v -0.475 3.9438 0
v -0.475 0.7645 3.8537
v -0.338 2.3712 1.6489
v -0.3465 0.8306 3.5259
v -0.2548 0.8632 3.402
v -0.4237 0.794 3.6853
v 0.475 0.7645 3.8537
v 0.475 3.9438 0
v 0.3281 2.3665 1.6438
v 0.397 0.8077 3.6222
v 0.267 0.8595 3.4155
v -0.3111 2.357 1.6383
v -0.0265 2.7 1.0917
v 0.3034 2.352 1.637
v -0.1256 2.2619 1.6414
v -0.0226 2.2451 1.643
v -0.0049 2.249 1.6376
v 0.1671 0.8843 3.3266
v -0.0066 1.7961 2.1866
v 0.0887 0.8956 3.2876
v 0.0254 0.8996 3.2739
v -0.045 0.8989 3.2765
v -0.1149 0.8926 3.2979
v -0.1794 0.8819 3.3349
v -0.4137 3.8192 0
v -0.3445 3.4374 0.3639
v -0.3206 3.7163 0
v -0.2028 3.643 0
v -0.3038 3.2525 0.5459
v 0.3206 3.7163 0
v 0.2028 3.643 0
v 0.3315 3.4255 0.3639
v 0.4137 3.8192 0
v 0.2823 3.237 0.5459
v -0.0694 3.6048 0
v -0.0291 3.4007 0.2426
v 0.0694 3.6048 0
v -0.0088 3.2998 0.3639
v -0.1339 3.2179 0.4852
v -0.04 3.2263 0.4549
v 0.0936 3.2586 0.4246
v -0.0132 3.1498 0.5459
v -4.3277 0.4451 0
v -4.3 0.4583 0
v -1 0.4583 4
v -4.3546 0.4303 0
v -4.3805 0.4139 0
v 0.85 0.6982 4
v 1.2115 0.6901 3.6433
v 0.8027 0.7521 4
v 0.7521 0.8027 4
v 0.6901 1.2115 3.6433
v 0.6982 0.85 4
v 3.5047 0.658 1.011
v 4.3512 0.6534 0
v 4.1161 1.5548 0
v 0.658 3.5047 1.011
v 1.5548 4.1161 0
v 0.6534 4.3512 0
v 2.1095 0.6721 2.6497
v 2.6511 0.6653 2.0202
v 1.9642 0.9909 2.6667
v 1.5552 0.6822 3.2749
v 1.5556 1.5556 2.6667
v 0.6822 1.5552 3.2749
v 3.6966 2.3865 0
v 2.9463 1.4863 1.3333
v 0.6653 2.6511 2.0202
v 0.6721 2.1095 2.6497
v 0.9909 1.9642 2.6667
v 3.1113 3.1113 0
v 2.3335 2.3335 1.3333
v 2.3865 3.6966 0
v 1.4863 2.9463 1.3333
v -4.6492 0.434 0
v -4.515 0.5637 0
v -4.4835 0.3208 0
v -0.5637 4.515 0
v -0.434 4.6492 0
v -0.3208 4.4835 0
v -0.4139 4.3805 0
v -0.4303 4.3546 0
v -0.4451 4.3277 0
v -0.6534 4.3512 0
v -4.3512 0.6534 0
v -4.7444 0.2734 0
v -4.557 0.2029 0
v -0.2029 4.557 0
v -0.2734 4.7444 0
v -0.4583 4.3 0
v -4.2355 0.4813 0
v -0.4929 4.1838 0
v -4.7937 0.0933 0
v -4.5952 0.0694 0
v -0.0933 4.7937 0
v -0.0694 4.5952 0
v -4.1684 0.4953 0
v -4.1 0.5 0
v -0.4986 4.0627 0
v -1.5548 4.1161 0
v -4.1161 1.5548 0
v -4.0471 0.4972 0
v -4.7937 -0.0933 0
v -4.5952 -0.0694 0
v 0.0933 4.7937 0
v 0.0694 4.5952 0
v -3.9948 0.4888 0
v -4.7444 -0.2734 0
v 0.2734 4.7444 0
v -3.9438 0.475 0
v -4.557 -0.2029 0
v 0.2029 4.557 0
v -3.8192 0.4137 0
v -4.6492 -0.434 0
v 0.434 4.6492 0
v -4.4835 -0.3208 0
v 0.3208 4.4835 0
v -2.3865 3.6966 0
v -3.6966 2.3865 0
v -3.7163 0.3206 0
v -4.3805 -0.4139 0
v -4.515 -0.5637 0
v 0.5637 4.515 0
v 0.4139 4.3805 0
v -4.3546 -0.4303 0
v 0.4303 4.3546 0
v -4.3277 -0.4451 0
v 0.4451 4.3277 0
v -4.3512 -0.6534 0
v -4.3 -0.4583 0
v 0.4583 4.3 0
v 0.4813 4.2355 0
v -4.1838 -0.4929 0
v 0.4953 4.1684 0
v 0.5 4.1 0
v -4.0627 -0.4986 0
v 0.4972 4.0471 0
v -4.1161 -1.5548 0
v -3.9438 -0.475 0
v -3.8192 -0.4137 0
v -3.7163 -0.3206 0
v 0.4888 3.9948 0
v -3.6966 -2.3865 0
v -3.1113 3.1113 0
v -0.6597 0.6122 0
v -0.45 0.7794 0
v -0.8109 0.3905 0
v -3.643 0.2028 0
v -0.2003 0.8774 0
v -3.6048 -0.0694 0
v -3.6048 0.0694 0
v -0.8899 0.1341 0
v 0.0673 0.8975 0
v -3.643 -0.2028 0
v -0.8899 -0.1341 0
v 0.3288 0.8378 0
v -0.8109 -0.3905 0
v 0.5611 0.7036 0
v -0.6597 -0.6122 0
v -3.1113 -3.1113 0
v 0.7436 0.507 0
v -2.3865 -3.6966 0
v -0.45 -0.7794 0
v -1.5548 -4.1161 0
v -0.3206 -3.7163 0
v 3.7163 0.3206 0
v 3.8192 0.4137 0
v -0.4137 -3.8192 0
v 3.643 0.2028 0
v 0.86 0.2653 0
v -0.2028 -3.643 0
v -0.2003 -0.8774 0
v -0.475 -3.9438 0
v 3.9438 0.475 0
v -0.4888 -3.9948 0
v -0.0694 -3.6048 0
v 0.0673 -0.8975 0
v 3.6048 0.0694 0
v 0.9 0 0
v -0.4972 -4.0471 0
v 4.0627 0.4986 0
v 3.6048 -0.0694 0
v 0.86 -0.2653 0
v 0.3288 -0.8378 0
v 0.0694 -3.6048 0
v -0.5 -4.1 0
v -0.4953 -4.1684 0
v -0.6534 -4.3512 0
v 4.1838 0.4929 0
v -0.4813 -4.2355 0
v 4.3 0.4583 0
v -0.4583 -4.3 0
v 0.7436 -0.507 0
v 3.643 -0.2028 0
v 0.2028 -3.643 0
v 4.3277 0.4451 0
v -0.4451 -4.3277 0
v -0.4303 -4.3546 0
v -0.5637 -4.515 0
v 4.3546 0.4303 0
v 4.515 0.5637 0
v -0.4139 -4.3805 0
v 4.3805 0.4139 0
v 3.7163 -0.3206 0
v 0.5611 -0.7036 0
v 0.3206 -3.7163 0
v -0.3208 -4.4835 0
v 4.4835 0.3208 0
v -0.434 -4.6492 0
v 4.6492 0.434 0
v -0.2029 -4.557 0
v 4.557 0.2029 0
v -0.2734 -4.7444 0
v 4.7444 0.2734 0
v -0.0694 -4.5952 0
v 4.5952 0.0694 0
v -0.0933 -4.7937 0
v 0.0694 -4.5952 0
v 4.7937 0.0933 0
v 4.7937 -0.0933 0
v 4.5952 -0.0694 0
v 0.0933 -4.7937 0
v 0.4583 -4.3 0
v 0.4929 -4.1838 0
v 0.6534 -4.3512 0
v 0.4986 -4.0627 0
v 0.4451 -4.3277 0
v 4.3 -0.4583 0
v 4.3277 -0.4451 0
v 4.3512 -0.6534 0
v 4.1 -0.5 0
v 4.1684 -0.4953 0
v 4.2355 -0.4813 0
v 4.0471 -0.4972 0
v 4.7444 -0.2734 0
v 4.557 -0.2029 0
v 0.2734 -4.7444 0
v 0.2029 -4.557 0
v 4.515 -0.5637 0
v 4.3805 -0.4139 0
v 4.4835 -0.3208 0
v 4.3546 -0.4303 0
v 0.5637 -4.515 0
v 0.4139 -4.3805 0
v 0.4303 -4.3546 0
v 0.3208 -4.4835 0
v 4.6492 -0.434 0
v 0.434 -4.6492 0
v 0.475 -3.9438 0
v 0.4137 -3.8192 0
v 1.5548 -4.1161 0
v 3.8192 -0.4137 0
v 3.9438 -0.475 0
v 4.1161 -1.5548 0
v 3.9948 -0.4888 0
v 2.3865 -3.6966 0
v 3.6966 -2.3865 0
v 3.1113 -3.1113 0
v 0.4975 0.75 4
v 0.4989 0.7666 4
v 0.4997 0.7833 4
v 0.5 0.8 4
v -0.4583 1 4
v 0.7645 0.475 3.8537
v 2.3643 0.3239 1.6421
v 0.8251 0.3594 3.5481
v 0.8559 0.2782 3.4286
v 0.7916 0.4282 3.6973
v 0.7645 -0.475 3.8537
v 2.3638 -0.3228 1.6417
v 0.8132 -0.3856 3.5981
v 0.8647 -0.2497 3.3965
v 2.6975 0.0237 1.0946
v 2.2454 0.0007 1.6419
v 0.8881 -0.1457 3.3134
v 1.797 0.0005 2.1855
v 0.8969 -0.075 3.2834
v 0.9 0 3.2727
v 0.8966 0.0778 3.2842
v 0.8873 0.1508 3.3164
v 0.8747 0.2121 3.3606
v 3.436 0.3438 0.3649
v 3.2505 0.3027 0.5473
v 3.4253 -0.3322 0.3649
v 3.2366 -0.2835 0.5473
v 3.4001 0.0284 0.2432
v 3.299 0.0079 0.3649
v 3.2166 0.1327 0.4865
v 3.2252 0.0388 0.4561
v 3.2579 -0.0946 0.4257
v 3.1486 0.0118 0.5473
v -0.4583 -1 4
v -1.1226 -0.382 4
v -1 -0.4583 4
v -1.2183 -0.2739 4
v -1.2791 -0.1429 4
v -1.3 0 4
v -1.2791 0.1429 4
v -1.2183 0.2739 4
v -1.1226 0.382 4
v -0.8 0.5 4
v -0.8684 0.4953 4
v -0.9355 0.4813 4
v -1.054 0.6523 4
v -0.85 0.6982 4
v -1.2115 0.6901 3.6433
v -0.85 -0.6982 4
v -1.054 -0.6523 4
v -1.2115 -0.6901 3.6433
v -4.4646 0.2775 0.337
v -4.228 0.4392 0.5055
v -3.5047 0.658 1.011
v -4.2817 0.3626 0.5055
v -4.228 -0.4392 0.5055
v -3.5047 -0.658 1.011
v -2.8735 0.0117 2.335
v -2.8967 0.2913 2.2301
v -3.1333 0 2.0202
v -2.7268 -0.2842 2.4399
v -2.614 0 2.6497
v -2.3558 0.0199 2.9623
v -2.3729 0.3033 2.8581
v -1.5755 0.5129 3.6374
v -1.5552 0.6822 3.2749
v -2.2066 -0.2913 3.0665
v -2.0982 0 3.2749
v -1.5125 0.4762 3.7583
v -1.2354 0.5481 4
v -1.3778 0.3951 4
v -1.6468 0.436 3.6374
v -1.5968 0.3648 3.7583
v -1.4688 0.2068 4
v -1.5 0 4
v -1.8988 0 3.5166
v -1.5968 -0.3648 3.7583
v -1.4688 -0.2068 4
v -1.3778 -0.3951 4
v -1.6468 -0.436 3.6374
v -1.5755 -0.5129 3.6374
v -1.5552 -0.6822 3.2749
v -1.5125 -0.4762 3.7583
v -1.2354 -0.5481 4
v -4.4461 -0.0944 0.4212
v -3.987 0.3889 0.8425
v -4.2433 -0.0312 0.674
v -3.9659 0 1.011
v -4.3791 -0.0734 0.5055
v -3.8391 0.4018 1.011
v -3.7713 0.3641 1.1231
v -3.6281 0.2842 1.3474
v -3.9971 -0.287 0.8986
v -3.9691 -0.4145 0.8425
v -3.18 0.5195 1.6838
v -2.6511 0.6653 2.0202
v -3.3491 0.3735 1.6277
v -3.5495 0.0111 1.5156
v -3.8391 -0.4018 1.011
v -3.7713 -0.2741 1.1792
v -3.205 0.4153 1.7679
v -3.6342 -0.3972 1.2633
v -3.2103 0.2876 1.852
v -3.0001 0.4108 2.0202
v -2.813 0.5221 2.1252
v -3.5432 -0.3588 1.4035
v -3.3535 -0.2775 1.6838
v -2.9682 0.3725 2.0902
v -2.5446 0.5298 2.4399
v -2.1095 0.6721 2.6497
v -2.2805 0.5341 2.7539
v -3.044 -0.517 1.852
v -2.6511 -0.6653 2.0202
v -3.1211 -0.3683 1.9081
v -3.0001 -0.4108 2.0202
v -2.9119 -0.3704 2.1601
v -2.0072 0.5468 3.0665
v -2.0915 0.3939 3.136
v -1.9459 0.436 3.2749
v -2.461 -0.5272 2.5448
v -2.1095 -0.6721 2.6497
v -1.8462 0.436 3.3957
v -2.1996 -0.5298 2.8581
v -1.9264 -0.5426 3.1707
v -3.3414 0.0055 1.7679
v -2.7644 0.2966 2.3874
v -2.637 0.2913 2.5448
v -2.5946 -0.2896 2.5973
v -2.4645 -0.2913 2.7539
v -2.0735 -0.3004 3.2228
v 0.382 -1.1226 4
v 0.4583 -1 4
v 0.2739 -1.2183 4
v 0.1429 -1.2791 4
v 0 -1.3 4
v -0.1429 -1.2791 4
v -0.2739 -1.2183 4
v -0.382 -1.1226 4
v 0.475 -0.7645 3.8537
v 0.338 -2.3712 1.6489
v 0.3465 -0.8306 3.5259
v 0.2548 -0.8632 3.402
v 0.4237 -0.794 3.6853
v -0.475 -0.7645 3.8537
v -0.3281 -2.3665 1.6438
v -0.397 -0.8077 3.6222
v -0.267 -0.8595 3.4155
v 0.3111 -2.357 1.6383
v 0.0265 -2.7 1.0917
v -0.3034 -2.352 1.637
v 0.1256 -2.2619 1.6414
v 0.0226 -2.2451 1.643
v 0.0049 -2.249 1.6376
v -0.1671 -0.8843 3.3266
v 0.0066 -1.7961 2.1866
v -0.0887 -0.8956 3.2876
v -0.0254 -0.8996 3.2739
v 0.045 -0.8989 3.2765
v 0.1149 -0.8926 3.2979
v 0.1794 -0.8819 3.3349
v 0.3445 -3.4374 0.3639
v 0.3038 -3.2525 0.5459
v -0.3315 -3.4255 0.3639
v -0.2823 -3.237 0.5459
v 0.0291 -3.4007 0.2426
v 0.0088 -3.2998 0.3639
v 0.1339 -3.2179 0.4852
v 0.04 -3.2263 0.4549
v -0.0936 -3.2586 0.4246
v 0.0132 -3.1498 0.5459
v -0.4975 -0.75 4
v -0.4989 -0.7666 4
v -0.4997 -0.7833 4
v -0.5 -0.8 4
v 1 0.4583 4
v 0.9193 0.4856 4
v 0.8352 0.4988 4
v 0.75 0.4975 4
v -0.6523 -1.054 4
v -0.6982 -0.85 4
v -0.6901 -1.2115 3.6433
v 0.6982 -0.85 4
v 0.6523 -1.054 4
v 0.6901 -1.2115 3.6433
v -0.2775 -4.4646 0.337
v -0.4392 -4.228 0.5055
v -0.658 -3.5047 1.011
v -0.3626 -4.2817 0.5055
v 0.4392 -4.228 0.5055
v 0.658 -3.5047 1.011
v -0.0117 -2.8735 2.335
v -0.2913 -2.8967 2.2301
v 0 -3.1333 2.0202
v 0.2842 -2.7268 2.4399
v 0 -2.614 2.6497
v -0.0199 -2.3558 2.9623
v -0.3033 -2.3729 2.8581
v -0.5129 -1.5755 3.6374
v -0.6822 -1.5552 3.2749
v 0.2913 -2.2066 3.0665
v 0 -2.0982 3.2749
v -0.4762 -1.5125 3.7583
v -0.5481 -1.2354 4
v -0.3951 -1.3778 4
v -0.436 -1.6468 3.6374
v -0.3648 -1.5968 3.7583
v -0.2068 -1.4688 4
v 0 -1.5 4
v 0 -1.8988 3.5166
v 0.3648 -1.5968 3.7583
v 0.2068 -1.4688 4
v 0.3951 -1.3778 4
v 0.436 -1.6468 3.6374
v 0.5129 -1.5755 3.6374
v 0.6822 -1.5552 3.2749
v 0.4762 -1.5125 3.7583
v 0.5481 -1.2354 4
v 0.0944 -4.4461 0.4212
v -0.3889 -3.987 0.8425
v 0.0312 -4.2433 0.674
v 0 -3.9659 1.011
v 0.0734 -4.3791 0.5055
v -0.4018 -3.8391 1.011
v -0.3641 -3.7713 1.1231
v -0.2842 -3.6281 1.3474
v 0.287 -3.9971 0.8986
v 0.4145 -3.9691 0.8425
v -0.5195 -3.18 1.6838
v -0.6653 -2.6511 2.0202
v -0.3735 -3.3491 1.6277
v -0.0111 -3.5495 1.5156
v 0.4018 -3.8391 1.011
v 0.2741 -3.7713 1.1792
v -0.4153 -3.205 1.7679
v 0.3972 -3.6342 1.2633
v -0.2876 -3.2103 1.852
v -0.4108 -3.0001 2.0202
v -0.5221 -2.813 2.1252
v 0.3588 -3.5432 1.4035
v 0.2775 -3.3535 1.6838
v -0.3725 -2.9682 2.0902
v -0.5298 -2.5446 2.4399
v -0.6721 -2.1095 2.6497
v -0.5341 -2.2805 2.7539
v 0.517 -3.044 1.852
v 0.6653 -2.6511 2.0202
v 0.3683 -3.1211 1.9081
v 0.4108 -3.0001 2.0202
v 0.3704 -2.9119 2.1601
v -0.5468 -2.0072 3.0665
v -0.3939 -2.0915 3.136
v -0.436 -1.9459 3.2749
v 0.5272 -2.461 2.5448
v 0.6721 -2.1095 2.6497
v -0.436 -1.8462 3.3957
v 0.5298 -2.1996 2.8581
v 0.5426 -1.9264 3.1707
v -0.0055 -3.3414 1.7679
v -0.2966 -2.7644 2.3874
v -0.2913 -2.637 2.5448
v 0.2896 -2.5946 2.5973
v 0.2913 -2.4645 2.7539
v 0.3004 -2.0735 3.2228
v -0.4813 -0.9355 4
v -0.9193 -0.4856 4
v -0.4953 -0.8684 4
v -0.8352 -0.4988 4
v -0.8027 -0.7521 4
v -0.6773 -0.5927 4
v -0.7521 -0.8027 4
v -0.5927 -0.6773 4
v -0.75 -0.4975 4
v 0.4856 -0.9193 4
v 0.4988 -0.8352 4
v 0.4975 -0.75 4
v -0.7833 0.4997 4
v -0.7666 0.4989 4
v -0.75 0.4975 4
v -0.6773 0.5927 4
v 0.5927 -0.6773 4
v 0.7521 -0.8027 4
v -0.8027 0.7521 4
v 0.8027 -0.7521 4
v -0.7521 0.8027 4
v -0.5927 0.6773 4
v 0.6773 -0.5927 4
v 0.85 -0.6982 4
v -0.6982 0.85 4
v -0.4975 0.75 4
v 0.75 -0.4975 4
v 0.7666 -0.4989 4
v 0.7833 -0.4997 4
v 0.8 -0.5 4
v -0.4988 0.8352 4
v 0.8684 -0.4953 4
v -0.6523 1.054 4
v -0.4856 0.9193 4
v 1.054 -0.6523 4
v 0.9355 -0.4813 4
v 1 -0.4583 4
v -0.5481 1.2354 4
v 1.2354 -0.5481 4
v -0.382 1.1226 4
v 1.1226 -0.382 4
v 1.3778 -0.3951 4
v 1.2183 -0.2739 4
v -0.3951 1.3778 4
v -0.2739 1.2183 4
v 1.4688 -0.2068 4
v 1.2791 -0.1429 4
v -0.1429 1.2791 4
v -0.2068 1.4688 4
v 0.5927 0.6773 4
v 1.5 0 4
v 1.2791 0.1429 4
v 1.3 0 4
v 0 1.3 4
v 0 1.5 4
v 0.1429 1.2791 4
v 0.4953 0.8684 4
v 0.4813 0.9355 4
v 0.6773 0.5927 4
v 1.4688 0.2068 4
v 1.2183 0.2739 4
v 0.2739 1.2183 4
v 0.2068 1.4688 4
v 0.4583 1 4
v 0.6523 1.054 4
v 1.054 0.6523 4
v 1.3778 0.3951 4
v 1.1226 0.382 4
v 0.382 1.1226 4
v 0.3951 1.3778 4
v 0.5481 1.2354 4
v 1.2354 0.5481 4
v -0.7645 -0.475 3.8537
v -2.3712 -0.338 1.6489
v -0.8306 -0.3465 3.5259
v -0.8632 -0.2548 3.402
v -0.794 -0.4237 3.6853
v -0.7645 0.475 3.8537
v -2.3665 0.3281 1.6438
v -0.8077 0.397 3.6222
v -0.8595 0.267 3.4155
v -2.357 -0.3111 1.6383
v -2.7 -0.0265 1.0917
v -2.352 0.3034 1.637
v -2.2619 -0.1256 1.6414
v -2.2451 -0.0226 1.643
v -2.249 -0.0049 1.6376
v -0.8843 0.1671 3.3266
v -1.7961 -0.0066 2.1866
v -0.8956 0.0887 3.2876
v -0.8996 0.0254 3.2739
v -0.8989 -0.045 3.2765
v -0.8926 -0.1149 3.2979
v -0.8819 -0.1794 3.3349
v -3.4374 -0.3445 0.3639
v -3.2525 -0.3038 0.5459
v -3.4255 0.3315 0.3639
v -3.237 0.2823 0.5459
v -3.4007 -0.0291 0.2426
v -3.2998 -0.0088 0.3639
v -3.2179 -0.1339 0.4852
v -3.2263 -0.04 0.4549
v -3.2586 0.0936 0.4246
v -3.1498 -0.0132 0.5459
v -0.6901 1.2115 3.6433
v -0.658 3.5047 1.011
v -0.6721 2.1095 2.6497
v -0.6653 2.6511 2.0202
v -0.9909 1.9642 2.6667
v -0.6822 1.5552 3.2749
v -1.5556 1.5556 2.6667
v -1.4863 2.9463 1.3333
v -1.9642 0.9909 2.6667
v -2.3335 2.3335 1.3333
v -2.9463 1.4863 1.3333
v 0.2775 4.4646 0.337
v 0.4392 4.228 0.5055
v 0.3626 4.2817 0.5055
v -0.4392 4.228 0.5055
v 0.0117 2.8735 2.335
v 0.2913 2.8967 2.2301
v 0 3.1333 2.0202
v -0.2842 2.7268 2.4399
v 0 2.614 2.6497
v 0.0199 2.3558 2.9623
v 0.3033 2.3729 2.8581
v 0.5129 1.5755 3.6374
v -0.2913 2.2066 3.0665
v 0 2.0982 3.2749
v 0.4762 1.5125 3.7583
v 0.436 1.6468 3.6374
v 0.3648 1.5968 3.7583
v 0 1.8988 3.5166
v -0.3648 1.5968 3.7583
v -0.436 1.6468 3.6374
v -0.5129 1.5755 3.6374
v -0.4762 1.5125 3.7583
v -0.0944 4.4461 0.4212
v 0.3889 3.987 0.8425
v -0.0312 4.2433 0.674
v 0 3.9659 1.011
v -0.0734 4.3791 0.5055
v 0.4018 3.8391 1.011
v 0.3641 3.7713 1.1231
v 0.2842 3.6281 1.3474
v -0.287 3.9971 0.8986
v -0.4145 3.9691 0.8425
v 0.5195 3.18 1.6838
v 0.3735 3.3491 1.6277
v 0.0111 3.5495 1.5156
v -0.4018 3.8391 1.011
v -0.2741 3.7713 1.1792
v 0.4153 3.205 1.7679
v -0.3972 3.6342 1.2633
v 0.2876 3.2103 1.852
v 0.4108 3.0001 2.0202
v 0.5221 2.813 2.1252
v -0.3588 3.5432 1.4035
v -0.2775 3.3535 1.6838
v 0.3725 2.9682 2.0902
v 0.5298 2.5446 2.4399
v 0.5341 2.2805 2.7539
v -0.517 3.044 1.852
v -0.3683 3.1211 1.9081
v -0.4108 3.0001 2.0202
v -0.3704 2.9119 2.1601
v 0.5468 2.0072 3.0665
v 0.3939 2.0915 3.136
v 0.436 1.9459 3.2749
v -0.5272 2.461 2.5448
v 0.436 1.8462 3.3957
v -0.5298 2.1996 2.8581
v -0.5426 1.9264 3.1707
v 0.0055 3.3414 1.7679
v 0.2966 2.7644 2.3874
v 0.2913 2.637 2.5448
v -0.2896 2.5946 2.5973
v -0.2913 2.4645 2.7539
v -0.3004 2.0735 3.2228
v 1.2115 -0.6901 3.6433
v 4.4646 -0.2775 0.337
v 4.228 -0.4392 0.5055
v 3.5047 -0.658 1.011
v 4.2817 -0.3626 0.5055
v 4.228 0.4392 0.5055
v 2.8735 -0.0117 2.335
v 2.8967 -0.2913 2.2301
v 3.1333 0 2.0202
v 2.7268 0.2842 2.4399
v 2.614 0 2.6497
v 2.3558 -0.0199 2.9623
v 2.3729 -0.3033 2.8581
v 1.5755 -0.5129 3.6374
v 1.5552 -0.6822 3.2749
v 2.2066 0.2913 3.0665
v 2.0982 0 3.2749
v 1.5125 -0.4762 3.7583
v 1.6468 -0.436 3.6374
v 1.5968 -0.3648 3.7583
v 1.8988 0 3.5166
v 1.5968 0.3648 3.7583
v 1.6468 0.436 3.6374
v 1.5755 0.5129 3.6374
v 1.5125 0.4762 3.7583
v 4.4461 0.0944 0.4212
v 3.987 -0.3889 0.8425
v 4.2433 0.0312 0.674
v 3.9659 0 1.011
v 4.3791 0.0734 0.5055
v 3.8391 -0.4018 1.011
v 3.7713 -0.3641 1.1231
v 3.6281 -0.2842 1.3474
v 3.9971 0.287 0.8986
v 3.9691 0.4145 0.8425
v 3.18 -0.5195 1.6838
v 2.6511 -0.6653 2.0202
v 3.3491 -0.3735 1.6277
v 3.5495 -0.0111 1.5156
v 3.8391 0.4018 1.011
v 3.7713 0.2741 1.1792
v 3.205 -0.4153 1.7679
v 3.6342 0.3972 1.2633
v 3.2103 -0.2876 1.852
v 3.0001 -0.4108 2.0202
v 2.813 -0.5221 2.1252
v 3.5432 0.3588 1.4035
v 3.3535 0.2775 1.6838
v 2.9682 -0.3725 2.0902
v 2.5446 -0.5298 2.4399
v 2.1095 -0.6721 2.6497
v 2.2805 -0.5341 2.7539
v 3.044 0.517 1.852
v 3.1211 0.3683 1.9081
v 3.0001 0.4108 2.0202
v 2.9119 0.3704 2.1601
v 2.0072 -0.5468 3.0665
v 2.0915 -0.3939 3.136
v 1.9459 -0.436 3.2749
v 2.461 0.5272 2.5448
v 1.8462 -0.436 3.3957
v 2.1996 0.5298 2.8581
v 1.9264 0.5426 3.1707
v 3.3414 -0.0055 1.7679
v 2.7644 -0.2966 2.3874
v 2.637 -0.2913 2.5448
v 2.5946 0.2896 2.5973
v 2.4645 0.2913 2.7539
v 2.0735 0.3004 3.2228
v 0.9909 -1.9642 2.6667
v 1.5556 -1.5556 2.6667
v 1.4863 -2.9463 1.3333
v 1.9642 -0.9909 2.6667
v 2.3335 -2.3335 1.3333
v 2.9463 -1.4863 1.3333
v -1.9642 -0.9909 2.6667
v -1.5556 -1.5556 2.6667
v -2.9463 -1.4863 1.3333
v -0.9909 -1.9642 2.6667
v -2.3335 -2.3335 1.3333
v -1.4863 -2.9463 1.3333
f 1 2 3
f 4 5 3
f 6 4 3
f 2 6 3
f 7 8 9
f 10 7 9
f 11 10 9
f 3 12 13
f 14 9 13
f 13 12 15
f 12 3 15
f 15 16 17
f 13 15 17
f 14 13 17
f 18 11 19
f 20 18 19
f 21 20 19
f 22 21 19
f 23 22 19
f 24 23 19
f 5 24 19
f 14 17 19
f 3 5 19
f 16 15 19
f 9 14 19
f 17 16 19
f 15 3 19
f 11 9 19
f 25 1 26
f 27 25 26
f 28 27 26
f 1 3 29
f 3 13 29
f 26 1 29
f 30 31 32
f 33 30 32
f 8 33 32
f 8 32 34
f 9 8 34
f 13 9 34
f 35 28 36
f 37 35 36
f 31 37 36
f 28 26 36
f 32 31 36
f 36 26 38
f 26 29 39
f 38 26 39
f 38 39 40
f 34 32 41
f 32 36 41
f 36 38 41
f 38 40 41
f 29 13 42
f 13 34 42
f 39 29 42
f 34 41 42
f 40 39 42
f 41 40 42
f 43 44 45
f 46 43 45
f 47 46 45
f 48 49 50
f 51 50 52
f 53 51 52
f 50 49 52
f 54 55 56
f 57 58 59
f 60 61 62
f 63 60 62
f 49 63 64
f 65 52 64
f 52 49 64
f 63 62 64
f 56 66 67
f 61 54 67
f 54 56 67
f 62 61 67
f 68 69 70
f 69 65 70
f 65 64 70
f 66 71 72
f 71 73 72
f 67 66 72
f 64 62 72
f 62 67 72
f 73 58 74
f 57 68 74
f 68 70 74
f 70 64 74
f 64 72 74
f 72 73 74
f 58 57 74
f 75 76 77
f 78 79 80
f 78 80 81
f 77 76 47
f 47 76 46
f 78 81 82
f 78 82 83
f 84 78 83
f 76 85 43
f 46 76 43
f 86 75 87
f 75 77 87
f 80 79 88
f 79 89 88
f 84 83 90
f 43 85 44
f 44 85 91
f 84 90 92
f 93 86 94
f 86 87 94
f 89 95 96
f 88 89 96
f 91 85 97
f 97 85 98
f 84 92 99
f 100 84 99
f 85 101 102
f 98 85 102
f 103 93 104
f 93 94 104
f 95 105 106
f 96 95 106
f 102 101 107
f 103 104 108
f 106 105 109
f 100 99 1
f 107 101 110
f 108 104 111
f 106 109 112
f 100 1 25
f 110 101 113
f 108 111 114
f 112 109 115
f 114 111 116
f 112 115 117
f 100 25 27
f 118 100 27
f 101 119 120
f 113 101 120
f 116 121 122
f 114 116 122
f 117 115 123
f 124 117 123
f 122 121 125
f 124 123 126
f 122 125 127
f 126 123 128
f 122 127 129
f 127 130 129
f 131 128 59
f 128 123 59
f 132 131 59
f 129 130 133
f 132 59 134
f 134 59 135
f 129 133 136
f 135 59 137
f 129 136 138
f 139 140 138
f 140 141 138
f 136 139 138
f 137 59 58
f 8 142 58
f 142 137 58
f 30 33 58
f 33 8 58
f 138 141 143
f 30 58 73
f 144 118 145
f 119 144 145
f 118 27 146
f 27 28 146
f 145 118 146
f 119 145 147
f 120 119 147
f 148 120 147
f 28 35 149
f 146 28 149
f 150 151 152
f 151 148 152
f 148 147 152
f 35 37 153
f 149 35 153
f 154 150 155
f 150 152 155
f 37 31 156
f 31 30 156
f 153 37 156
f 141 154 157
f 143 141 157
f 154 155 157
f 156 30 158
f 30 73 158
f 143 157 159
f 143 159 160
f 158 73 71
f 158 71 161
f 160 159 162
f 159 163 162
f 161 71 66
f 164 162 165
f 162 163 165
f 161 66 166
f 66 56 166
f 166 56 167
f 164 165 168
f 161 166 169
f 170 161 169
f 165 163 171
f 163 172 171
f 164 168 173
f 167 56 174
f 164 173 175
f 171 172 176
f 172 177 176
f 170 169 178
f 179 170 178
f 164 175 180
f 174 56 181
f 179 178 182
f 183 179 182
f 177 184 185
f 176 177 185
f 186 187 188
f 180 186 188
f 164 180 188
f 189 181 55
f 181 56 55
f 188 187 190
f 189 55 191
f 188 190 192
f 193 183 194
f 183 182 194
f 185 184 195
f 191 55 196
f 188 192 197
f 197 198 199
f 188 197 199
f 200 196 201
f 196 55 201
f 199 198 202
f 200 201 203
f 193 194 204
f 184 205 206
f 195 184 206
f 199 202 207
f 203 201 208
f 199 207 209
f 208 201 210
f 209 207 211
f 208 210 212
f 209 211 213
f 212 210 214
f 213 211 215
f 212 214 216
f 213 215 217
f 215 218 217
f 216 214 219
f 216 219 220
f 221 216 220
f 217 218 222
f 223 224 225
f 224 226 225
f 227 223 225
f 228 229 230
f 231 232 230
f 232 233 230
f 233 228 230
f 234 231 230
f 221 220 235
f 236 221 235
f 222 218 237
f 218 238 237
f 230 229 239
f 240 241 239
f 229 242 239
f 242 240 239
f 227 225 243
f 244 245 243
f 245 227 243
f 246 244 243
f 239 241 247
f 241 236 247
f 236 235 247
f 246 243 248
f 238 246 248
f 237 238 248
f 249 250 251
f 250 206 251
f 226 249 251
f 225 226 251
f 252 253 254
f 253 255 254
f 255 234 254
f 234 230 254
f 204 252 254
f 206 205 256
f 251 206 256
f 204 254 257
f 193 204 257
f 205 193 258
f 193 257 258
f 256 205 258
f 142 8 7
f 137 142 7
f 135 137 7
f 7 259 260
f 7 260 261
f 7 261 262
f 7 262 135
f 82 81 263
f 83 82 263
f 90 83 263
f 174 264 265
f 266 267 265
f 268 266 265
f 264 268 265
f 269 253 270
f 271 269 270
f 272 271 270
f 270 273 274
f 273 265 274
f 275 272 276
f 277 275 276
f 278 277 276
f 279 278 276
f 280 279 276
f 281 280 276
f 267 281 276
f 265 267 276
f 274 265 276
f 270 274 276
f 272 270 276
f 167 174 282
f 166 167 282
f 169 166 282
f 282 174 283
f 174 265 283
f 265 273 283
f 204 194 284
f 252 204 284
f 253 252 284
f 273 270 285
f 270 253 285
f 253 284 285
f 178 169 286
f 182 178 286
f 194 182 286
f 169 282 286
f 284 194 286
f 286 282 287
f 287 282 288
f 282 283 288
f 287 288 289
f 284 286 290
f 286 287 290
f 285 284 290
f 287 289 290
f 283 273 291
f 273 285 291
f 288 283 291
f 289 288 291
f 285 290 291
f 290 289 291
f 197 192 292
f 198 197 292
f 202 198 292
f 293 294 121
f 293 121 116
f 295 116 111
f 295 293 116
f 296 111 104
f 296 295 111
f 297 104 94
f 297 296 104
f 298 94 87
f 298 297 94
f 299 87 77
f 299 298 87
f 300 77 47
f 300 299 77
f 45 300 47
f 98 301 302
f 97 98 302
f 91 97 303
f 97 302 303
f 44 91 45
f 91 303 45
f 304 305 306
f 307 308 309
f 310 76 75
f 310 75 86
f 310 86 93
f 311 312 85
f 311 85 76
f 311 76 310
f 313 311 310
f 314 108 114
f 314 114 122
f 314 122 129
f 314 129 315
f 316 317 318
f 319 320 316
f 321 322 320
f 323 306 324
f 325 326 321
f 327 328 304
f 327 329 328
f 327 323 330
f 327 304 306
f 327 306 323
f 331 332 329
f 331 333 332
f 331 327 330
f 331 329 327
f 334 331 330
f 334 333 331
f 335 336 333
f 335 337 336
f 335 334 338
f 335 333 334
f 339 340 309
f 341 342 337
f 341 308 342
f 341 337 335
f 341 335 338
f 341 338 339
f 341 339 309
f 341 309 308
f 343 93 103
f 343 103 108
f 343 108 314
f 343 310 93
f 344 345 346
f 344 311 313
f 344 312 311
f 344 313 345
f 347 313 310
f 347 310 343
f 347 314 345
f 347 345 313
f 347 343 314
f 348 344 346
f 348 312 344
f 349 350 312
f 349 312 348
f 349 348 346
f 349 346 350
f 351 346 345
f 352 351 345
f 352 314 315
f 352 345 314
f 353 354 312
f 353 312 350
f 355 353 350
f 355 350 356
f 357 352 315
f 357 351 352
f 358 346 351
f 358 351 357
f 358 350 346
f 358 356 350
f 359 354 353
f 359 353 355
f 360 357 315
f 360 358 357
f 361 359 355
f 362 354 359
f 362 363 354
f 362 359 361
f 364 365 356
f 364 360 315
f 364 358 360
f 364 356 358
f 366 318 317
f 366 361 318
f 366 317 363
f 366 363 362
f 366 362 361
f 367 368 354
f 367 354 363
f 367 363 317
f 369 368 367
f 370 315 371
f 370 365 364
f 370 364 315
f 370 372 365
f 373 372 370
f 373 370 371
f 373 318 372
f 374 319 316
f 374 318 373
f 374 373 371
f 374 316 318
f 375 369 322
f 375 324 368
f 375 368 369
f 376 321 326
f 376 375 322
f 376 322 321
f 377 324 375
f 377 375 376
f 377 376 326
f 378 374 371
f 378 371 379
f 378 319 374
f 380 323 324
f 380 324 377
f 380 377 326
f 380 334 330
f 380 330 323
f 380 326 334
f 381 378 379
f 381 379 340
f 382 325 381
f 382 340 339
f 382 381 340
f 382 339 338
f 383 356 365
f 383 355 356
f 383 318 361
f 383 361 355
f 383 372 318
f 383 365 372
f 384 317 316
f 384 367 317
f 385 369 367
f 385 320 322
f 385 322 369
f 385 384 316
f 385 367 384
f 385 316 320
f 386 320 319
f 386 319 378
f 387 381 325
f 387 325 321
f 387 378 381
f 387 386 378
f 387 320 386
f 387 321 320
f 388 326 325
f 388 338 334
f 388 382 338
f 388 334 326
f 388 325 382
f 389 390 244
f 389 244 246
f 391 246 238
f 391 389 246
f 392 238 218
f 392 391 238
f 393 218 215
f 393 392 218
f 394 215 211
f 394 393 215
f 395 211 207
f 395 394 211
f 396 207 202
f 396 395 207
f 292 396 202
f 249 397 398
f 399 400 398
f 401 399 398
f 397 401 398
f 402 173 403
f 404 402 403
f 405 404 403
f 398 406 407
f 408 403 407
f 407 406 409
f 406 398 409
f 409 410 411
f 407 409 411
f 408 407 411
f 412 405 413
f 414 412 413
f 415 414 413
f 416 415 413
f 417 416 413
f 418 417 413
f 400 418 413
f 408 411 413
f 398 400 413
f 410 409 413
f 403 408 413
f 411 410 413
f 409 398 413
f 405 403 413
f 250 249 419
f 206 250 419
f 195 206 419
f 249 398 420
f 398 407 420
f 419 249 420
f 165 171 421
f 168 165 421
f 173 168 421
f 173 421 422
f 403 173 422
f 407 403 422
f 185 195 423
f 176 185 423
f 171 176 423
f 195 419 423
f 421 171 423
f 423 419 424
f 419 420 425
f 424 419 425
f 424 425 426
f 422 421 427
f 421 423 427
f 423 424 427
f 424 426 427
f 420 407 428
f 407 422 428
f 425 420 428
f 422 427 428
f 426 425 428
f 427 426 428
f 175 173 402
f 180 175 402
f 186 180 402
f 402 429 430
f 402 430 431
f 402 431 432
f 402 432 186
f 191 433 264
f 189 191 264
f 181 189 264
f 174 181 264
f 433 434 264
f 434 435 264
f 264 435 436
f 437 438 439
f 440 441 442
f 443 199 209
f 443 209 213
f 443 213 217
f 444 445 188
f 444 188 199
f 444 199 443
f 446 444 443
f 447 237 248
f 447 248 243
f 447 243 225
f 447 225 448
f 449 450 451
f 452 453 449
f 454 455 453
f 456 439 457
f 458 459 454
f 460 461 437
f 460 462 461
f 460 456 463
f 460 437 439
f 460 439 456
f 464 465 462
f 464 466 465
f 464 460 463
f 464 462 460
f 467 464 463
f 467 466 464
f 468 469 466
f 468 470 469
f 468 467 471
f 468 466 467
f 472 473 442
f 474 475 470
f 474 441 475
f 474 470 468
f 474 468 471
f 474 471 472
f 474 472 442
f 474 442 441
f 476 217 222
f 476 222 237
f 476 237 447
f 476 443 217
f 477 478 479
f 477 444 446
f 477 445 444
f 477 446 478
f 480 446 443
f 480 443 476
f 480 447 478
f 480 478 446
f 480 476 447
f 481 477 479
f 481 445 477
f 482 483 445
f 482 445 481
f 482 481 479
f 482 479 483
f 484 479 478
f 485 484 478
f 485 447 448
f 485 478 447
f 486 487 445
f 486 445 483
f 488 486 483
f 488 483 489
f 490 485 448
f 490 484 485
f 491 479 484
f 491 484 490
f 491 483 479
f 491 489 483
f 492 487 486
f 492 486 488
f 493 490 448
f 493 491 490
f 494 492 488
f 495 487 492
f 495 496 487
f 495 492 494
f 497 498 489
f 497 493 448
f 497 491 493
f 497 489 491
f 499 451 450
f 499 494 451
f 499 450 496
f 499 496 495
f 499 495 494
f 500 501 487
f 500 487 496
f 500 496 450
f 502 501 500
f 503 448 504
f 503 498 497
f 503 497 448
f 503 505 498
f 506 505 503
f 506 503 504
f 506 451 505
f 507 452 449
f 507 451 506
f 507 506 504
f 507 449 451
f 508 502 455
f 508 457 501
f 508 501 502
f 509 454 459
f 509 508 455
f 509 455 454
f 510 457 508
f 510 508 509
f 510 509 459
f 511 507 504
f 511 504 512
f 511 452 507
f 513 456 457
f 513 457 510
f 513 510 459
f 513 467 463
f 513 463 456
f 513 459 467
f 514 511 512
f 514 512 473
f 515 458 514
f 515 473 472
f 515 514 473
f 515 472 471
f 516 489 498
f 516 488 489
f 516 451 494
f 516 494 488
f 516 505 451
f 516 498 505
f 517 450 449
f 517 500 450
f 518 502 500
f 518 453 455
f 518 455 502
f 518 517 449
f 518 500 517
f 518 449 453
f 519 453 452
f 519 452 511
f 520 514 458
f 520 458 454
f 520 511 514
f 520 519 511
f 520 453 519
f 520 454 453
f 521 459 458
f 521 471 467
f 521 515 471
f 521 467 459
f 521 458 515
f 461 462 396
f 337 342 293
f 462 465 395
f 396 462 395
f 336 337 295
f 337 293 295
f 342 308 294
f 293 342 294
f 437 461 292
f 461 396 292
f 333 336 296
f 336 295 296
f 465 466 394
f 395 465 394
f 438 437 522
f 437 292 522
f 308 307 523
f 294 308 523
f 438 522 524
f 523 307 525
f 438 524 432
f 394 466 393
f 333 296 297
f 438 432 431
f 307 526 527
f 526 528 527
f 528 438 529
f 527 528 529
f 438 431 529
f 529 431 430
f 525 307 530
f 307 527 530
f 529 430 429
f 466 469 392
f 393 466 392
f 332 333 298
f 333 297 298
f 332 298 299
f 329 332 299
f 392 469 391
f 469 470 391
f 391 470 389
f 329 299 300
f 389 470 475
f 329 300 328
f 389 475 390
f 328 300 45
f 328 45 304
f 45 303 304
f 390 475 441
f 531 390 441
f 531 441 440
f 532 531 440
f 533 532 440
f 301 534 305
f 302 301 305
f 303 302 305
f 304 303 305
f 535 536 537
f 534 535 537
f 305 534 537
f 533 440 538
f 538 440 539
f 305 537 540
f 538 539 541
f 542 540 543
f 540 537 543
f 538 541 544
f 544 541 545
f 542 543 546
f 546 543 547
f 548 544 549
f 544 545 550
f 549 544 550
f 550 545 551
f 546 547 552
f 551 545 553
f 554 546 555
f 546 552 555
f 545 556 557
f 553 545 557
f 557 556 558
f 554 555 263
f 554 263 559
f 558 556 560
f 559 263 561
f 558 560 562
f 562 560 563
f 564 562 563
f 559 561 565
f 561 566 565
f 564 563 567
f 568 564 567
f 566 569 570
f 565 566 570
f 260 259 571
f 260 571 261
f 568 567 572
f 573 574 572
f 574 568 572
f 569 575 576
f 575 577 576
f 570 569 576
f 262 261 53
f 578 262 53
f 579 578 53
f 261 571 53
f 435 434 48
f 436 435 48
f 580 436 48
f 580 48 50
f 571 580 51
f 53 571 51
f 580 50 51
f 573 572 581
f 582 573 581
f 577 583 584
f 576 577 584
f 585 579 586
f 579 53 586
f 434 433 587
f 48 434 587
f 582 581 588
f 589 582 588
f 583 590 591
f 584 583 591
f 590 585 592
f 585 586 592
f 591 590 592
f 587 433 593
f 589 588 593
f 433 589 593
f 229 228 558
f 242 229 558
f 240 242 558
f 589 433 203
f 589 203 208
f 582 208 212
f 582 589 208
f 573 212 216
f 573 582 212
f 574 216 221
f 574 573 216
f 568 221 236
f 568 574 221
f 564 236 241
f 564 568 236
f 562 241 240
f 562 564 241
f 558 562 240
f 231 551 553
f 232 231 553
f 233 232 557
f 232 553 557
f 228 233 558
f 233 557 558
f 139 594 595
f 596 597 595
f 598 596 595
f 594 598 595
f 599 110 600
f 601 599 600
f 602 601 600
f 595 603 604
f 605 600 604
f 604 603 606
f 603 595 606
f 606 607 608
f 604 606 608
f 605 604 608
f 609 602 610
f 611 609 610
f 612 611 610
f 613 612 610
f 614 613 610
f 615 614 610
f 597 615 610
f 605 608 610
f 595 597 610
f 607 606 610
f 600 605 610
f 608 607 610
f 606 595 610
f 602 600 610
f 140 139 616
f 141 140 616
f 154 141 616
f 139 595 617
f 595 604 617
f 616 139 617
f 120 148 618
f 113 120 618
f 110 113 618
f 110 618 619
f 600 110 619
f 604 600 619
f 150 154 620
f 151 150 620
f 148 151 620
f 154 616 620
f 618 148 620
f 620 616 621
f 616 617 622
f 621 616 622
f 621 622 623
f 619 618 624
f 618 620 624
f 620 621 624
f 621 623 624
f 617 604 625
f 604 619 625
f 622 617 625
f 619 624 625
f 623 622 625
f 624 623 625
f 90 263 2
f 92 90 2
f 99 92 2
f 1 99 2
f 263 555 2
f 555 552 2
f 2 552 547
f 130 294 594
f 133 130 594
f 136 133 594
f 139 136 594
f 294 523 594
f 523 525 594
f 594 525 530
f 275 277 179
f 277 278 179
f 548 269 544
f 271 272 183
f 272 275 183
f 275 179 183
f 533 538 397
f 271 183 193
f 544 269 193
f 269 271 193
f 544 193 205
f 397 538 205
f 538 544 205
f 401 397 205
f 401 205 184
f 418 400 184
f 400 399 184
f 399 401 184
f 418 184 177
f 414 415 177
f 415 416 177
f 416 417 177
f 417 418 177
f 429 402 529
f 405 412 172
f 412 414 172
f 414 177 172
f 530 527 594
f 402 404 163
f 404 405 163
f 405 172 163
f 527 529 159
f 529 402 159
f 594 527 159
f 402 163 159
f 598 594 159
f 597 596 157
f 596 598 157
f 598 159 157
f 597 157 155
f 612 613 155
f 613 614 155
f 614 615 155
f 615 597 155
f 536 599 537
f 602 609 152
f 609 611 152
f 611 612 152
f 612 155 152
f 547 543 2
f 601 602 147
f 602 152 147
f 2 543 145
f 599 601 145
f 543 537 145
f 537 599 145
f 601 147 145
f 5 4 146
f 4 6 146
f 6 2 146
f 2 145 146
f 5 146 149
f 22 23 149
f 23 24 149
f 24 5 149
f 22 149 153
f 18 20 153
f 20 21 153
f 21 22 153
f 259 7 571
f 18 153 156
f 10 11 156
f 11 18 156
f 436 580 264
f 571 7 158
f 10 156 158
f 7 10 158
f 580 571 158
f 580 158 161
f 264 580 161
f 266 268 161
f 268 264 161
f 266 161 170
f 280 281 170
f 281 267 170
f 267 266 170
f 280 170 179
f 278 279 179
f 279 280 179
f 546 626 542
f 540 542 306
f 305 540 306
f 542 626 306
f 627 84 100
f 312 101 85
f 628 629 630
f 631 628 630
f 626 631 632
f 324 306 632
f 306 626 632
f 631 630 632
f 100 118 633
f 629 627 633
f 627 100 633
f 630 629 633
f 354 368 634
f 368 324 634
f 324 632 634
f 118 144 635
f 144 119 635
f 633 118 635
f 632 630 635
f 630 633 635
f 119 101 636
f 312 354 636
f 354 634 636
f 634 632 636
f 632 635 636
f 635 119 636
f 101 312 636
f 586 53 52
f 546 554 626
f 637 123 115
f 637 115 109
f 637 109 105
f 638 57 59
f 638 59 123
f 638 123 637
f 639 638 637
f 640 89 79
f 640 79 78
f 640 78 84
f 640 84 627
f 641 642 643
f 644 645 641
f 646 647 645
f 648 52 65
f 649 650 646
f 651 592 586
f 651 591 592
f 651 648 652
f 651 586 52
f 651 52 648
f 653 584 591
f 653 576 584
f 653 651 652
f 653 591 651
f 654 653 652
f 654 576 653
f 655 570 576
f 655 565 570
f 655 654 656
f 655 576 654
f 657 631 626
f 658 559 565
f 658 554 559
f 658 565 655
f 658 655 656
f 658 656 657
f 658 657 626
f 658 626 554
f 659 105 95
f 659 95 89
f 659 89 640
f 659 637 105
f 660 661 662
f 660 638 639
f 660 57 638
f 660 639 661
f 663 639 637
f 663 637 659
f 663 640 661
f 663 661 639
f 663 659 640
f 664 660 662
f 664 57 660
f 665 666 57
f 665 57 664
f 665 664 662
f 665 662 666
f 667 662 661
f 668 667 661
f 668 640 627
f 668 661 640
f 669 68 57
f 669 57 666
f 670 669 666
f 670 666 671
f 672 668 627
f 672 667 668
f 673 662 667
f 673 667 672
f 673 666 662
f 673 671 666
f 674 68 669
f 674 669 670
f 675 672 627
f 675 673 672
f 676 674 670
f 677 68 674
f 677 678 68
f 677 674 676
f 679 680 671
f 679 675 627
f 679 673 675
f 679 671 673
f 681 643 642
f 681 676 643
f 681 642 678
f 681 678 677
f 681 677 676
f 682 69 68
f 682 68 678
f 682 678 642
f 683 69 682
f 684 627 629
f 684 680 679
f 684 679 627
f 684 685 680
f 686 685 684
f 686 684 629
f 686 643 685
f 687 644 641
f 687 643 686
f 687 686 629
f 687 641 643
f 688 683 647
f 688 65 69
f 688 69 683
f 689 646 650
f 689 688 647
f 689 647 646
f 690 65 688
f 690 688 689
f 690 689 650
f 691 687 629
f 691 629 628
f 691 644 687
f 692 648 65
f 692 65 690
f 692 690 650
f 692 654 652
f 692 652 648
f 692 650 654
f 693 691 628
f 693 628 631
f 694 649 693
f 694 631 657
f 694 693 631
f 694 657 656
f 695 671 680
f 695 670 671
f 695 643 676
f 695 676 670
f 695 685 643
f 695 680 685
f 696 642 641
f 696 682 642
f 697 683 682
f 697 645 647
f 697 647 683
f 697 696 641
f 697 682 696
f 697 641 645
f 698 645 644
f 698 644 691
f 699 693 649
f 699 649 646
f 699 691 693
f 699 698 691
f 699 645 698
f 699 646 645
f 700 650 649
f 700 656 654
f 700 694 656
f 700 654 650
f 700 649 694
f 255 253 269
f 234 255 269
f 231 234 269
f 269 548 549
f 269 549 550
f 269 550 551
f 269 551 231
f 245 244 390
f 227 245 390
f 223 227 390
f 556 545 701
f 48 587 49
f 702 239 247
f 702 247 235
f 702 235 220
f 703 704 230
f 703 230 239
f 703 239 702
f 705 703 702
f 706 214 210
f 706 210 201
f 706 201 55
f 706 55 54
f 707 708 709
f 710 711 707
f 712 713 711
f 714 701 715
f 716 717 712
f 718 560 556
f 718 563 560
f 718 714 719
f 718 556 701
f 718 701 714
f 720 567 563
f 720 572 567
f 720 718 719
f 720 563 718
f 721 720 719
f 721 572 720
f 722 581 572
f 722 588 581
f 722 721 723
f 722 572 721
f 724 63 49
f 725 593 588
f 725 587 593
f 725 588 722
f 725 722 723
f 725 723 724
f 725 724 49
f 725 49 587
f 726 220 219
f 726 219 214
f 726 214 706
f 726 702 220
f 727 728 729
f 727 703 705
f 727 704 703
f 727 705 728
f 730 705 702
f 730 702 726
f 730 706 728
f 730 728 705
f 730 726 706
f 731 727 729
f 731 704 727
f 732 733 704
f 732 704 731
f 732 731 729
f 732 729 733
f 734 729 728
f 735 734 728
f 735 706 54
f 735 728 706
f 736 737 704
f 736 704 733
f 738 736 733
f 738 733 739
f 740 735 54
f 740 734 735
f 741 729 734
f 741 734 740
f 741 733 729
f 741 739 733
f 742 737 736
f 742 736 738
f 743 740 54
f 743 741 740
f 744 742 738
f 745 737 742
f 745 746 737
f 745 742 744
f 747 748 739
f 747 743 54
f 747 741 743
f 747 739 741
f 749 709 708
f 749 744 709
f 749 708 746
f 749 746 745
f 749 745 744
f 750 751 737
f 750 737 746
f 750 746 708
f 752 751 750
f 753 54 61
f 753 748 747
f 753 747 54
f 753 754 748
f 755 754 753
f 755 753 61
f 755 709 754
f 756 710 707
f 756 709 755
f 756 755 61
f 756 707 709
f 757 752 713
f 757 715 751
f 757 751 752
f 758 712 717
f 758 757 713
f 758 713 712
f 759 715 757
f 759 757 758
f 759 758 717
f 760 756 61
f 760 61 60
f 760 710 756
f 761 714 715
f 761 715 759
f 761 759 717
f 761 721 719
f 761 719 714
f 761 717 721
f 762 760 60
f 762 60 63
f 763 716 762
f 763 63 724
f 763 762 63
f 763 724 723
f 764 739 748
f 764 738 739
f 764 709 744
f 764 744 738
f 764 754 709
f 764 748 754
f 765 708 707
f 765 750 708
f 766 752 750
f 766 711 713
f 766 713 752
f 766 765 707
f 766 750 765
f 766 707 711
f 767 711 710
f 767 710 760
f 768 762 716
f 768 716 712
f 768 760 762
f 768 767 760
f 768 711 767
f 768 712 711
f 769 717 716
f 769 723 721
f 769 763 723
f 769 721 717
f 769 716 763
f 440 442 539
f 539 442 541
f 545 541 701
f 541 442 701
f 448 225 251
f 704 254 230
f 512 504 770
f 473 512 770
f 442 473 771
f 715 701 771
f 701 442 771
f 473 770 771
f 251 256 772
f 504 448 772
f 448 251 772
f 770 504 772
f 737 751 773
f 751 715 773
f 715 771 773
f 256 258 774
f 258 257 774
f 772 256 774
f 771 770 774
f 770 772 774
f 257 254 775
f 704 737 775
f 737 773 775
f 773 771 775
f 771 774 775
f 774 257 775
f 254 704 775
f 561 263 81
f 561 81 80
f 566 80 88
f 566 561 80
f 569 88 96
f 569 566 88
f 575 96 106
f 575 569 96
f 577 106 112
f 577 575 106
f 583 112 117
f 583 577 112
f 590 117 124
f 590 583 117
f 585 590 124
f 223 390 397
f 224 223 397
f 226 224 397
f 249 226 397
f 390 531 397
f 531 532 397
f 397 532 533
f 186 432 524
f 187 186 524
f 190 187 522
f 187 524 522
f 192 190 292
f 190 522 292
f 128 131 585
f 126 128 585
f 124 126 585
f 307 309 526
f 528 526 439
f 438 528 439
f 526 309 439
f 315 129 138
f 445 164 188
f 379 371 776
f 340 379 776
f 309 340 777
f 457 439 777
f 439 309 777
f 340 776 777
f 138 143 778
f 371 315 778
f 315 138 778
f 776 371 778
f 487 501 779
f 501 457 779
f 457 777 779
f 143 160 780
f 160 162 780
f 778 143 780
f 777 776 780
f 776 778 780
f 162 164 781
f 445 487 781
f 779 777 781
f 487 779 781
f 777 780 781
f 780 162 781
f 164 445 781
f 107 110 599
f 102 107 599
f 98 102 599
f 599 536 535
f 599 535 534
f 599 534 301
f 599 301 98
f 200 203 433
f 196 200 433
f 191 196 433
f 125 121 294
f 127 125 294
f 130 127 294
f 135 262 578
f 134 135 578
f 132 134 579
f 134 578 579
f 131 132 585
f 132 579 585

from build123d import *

# Parameters (mm, degrees)
F7_COUNT  = 4
F8_COUNT  = 4
F10_R     = 0.9
F11_DEPTH = 4


with BuildPart() as f1:
    # F0 (on Front) → F1 (revolve)
    with BuildSketch(Plane.XZ):
        Polygon((-0.8, 0), (-0.8, 4), (-1.1, 4), (-4.4, 0), align=None)
    revolve(axis=Axis((0, 0, 2), (0, 0, 1)))

    # F5: sweep along a path in F4
    with BuildLine(Plane(origin=(0, 0, 0), x_dir=(0, -1, 0), z_dir=(-1, 0, 0))) as f5_path:
        Line((-4.4, 0), (-1.1, 4))
    # F2 (on face) → F5 (sweep)
    with BuildSketch(Plane.XY.offset(4)):
        with BuildLine():
            ThreePointArc((0.4582575695, 1), (0.5830784403, 0.9327483757), (0.6982120022, 0.85))
            ThreePointArc((0.6982120022, 0.85), (0, 1.5), (-0.6982120022, 0.85))
            ThreePointArc((-0.6982120022, 0.85), (-0.5830784403, 0.9327483757), (-0.4582575695, 1))
            ThreePointArc((-0.4582575695, 1), (0, 1.3), (0.4582575695, 1))
        make_face()
        with BuildLine():
            ThreePointArc((-0.4582575695, 1), (-0.5830784403, 0.9327483757), (-0.6982120022, 0.85))
            ThreePointArc((-0.6982120022, 0.85), (-0.6873150882, 0.667342661), (-0.6294528874, 0.49375))
            ThreePointArc((-0.6294528874, 0.49375), (-0.5572758185, 0.5739718304), (-0.4749588798, 0.64375))
            ThreePointArc((-0.4749588798, 0.64375), (-0.49945145, 0.823414719), (-0.4582575695, 1))
        make_face()
        with BuildLine():
            ThreePointArc((-0.6294528874, 0.49375), (0, 0.1), (0.6294528874, 0.49375))
            ThreePointArc((0.6294528874, 0.49375), (0.5572758185, 0.5739718304), (0.4749588798, 0.64375))
            ThreePointArc((0.4749588798, 0.64375), (0, 0.3), (-0.4749588798, 0.64375))
            ThreePointArc((-0.4749588798, 0.64375), (-0.5572758185, 0.5739718304), (-0.6294528874, 0.49375))
        make_face()
        with BuildLine():
            ThreePointArc((0.6294528874, 0.49375), (0.6821352583, 0.6428647417), (0.7, 0.8))
            ThreePointArc((0.7, 0.8), (0.6995528577, 0.8250159796), (0.6982120022, 0.85))
            ThreePointArc((0.6982120022, 0.85), (0.5830784403, 0.9327483757), (0.4582575695, 1))
            ThreePointArc((0.4582575695, 1), (0.4894531565, 0.9021548218), (0.5, 0.8))
            ThreePointArc((0.5, 0.8), (0.4937000303, 0.7208780685), (0.4749588798, 0.64375))
            ThreePointArc((0.4749588798, 0.64375), (0.5572758185, 0.5739718304), (0.6294528874, 0.49375))
        make_face()
    sweep(path=f5_path.line)

    # F6: sweep along a path in F4
    with BuildLine(Plane(origin=(0, 0, 0), x_dir=(0, -1, 0), z_dir=(-1, 0, 0))) as f6_path:
        Line((-4.4, 0), (-1.1, 4))
    # F2 (on face) → F6 (sweep, cut)
    with BuildSketch(Plane.XY.offset(4)):
        with BuildLine():
            ThreePointArc((-0.4582575695, 1), (0, 1.1), (0.4582575695, 1))
            ThreePointArc((0.4582575695, 1), (0, 1.3), (-0.4582575695, 1))
        make_face()
        with BuildLine():
            ThreePointArc((-0.4749588798, 0.64375), (0, 0.3), (0.4749588798, 0.64375))
            ThreePointArc((0.4749588798, 0.64375), (0, 0.8), (-0.4749588798, 0.64375))
        make_face()
        with BuildLine():
            ThreePointArc((0.5, 0.8), (0.4894531565, 0.9021548218), (0.4582575695, 1))
            ThreePointArc((0.4582575695, 1), (0, 1.1), (-0.4582575695, 1))
            ThreePointArc((-0.4582575695, 1), (-0.49945145, 0.823414719), (-0.4749588798, 0.64375))
            ThreePointArc((-0.4749588798, 0.64375), (0, 0.8), (0.4749588798, 0.64375))
            ThreePointArc((0.4749588798, 0.64375), (0.4937000303, 0.7208780685), (0.5, 0.8))
        make_face()
    f6 = sweep(path=f6_path.line, mode=Mode.SUBTRACT)

    # F7: F6 ×4 about axis
    f7_axis = Axis((0, 0, 4), (0, 0, -1))
    for i in range(1, F7_COUNT):
        add(f6.rotate(f7_axis, i * 360 / F7_COUNT), mode=Mode.SUBTRACT)


with BuildPart() as f8_1:
    # F8: instance of F1
    add(f1.part.rotate(Axis((0, 0, 0), (0, 0, 1)), 1 * 360 / F8_COUNT))


with BuildPart() as f8_2:
    # F8: instance of F1
    add(f1.part.rotate(Axis((0, 0, 0), (0, 0, 1)), 2 * 360 / F8_COUNT))


with BuildPart() as f8_3:
    # F8: instance of F1
    add(f1.part.rotate(Axis((0, 0, 0), (0, 0, 1)), 3 * 360 / F8_COUNT))


with BuildPart() as f8_2_1:
    add(f8_2.part)

    # F9: union F8_3, F1, F8_1
    add(f8_3.part)
    add(f1.part)
    add(f8_1.part)

    # F10 (on face) → F11 (cut)
    with BuildSketch(Plane(origin=(0, 0, 0), x_dir=(1, 0, 0), z_dir=(0, 0, -1))):
        Circle(F10_R)
    extrude(amount=-F11_DEPTH, mode=Mode.SUBTRACT)


solid = f8_2_1.part
